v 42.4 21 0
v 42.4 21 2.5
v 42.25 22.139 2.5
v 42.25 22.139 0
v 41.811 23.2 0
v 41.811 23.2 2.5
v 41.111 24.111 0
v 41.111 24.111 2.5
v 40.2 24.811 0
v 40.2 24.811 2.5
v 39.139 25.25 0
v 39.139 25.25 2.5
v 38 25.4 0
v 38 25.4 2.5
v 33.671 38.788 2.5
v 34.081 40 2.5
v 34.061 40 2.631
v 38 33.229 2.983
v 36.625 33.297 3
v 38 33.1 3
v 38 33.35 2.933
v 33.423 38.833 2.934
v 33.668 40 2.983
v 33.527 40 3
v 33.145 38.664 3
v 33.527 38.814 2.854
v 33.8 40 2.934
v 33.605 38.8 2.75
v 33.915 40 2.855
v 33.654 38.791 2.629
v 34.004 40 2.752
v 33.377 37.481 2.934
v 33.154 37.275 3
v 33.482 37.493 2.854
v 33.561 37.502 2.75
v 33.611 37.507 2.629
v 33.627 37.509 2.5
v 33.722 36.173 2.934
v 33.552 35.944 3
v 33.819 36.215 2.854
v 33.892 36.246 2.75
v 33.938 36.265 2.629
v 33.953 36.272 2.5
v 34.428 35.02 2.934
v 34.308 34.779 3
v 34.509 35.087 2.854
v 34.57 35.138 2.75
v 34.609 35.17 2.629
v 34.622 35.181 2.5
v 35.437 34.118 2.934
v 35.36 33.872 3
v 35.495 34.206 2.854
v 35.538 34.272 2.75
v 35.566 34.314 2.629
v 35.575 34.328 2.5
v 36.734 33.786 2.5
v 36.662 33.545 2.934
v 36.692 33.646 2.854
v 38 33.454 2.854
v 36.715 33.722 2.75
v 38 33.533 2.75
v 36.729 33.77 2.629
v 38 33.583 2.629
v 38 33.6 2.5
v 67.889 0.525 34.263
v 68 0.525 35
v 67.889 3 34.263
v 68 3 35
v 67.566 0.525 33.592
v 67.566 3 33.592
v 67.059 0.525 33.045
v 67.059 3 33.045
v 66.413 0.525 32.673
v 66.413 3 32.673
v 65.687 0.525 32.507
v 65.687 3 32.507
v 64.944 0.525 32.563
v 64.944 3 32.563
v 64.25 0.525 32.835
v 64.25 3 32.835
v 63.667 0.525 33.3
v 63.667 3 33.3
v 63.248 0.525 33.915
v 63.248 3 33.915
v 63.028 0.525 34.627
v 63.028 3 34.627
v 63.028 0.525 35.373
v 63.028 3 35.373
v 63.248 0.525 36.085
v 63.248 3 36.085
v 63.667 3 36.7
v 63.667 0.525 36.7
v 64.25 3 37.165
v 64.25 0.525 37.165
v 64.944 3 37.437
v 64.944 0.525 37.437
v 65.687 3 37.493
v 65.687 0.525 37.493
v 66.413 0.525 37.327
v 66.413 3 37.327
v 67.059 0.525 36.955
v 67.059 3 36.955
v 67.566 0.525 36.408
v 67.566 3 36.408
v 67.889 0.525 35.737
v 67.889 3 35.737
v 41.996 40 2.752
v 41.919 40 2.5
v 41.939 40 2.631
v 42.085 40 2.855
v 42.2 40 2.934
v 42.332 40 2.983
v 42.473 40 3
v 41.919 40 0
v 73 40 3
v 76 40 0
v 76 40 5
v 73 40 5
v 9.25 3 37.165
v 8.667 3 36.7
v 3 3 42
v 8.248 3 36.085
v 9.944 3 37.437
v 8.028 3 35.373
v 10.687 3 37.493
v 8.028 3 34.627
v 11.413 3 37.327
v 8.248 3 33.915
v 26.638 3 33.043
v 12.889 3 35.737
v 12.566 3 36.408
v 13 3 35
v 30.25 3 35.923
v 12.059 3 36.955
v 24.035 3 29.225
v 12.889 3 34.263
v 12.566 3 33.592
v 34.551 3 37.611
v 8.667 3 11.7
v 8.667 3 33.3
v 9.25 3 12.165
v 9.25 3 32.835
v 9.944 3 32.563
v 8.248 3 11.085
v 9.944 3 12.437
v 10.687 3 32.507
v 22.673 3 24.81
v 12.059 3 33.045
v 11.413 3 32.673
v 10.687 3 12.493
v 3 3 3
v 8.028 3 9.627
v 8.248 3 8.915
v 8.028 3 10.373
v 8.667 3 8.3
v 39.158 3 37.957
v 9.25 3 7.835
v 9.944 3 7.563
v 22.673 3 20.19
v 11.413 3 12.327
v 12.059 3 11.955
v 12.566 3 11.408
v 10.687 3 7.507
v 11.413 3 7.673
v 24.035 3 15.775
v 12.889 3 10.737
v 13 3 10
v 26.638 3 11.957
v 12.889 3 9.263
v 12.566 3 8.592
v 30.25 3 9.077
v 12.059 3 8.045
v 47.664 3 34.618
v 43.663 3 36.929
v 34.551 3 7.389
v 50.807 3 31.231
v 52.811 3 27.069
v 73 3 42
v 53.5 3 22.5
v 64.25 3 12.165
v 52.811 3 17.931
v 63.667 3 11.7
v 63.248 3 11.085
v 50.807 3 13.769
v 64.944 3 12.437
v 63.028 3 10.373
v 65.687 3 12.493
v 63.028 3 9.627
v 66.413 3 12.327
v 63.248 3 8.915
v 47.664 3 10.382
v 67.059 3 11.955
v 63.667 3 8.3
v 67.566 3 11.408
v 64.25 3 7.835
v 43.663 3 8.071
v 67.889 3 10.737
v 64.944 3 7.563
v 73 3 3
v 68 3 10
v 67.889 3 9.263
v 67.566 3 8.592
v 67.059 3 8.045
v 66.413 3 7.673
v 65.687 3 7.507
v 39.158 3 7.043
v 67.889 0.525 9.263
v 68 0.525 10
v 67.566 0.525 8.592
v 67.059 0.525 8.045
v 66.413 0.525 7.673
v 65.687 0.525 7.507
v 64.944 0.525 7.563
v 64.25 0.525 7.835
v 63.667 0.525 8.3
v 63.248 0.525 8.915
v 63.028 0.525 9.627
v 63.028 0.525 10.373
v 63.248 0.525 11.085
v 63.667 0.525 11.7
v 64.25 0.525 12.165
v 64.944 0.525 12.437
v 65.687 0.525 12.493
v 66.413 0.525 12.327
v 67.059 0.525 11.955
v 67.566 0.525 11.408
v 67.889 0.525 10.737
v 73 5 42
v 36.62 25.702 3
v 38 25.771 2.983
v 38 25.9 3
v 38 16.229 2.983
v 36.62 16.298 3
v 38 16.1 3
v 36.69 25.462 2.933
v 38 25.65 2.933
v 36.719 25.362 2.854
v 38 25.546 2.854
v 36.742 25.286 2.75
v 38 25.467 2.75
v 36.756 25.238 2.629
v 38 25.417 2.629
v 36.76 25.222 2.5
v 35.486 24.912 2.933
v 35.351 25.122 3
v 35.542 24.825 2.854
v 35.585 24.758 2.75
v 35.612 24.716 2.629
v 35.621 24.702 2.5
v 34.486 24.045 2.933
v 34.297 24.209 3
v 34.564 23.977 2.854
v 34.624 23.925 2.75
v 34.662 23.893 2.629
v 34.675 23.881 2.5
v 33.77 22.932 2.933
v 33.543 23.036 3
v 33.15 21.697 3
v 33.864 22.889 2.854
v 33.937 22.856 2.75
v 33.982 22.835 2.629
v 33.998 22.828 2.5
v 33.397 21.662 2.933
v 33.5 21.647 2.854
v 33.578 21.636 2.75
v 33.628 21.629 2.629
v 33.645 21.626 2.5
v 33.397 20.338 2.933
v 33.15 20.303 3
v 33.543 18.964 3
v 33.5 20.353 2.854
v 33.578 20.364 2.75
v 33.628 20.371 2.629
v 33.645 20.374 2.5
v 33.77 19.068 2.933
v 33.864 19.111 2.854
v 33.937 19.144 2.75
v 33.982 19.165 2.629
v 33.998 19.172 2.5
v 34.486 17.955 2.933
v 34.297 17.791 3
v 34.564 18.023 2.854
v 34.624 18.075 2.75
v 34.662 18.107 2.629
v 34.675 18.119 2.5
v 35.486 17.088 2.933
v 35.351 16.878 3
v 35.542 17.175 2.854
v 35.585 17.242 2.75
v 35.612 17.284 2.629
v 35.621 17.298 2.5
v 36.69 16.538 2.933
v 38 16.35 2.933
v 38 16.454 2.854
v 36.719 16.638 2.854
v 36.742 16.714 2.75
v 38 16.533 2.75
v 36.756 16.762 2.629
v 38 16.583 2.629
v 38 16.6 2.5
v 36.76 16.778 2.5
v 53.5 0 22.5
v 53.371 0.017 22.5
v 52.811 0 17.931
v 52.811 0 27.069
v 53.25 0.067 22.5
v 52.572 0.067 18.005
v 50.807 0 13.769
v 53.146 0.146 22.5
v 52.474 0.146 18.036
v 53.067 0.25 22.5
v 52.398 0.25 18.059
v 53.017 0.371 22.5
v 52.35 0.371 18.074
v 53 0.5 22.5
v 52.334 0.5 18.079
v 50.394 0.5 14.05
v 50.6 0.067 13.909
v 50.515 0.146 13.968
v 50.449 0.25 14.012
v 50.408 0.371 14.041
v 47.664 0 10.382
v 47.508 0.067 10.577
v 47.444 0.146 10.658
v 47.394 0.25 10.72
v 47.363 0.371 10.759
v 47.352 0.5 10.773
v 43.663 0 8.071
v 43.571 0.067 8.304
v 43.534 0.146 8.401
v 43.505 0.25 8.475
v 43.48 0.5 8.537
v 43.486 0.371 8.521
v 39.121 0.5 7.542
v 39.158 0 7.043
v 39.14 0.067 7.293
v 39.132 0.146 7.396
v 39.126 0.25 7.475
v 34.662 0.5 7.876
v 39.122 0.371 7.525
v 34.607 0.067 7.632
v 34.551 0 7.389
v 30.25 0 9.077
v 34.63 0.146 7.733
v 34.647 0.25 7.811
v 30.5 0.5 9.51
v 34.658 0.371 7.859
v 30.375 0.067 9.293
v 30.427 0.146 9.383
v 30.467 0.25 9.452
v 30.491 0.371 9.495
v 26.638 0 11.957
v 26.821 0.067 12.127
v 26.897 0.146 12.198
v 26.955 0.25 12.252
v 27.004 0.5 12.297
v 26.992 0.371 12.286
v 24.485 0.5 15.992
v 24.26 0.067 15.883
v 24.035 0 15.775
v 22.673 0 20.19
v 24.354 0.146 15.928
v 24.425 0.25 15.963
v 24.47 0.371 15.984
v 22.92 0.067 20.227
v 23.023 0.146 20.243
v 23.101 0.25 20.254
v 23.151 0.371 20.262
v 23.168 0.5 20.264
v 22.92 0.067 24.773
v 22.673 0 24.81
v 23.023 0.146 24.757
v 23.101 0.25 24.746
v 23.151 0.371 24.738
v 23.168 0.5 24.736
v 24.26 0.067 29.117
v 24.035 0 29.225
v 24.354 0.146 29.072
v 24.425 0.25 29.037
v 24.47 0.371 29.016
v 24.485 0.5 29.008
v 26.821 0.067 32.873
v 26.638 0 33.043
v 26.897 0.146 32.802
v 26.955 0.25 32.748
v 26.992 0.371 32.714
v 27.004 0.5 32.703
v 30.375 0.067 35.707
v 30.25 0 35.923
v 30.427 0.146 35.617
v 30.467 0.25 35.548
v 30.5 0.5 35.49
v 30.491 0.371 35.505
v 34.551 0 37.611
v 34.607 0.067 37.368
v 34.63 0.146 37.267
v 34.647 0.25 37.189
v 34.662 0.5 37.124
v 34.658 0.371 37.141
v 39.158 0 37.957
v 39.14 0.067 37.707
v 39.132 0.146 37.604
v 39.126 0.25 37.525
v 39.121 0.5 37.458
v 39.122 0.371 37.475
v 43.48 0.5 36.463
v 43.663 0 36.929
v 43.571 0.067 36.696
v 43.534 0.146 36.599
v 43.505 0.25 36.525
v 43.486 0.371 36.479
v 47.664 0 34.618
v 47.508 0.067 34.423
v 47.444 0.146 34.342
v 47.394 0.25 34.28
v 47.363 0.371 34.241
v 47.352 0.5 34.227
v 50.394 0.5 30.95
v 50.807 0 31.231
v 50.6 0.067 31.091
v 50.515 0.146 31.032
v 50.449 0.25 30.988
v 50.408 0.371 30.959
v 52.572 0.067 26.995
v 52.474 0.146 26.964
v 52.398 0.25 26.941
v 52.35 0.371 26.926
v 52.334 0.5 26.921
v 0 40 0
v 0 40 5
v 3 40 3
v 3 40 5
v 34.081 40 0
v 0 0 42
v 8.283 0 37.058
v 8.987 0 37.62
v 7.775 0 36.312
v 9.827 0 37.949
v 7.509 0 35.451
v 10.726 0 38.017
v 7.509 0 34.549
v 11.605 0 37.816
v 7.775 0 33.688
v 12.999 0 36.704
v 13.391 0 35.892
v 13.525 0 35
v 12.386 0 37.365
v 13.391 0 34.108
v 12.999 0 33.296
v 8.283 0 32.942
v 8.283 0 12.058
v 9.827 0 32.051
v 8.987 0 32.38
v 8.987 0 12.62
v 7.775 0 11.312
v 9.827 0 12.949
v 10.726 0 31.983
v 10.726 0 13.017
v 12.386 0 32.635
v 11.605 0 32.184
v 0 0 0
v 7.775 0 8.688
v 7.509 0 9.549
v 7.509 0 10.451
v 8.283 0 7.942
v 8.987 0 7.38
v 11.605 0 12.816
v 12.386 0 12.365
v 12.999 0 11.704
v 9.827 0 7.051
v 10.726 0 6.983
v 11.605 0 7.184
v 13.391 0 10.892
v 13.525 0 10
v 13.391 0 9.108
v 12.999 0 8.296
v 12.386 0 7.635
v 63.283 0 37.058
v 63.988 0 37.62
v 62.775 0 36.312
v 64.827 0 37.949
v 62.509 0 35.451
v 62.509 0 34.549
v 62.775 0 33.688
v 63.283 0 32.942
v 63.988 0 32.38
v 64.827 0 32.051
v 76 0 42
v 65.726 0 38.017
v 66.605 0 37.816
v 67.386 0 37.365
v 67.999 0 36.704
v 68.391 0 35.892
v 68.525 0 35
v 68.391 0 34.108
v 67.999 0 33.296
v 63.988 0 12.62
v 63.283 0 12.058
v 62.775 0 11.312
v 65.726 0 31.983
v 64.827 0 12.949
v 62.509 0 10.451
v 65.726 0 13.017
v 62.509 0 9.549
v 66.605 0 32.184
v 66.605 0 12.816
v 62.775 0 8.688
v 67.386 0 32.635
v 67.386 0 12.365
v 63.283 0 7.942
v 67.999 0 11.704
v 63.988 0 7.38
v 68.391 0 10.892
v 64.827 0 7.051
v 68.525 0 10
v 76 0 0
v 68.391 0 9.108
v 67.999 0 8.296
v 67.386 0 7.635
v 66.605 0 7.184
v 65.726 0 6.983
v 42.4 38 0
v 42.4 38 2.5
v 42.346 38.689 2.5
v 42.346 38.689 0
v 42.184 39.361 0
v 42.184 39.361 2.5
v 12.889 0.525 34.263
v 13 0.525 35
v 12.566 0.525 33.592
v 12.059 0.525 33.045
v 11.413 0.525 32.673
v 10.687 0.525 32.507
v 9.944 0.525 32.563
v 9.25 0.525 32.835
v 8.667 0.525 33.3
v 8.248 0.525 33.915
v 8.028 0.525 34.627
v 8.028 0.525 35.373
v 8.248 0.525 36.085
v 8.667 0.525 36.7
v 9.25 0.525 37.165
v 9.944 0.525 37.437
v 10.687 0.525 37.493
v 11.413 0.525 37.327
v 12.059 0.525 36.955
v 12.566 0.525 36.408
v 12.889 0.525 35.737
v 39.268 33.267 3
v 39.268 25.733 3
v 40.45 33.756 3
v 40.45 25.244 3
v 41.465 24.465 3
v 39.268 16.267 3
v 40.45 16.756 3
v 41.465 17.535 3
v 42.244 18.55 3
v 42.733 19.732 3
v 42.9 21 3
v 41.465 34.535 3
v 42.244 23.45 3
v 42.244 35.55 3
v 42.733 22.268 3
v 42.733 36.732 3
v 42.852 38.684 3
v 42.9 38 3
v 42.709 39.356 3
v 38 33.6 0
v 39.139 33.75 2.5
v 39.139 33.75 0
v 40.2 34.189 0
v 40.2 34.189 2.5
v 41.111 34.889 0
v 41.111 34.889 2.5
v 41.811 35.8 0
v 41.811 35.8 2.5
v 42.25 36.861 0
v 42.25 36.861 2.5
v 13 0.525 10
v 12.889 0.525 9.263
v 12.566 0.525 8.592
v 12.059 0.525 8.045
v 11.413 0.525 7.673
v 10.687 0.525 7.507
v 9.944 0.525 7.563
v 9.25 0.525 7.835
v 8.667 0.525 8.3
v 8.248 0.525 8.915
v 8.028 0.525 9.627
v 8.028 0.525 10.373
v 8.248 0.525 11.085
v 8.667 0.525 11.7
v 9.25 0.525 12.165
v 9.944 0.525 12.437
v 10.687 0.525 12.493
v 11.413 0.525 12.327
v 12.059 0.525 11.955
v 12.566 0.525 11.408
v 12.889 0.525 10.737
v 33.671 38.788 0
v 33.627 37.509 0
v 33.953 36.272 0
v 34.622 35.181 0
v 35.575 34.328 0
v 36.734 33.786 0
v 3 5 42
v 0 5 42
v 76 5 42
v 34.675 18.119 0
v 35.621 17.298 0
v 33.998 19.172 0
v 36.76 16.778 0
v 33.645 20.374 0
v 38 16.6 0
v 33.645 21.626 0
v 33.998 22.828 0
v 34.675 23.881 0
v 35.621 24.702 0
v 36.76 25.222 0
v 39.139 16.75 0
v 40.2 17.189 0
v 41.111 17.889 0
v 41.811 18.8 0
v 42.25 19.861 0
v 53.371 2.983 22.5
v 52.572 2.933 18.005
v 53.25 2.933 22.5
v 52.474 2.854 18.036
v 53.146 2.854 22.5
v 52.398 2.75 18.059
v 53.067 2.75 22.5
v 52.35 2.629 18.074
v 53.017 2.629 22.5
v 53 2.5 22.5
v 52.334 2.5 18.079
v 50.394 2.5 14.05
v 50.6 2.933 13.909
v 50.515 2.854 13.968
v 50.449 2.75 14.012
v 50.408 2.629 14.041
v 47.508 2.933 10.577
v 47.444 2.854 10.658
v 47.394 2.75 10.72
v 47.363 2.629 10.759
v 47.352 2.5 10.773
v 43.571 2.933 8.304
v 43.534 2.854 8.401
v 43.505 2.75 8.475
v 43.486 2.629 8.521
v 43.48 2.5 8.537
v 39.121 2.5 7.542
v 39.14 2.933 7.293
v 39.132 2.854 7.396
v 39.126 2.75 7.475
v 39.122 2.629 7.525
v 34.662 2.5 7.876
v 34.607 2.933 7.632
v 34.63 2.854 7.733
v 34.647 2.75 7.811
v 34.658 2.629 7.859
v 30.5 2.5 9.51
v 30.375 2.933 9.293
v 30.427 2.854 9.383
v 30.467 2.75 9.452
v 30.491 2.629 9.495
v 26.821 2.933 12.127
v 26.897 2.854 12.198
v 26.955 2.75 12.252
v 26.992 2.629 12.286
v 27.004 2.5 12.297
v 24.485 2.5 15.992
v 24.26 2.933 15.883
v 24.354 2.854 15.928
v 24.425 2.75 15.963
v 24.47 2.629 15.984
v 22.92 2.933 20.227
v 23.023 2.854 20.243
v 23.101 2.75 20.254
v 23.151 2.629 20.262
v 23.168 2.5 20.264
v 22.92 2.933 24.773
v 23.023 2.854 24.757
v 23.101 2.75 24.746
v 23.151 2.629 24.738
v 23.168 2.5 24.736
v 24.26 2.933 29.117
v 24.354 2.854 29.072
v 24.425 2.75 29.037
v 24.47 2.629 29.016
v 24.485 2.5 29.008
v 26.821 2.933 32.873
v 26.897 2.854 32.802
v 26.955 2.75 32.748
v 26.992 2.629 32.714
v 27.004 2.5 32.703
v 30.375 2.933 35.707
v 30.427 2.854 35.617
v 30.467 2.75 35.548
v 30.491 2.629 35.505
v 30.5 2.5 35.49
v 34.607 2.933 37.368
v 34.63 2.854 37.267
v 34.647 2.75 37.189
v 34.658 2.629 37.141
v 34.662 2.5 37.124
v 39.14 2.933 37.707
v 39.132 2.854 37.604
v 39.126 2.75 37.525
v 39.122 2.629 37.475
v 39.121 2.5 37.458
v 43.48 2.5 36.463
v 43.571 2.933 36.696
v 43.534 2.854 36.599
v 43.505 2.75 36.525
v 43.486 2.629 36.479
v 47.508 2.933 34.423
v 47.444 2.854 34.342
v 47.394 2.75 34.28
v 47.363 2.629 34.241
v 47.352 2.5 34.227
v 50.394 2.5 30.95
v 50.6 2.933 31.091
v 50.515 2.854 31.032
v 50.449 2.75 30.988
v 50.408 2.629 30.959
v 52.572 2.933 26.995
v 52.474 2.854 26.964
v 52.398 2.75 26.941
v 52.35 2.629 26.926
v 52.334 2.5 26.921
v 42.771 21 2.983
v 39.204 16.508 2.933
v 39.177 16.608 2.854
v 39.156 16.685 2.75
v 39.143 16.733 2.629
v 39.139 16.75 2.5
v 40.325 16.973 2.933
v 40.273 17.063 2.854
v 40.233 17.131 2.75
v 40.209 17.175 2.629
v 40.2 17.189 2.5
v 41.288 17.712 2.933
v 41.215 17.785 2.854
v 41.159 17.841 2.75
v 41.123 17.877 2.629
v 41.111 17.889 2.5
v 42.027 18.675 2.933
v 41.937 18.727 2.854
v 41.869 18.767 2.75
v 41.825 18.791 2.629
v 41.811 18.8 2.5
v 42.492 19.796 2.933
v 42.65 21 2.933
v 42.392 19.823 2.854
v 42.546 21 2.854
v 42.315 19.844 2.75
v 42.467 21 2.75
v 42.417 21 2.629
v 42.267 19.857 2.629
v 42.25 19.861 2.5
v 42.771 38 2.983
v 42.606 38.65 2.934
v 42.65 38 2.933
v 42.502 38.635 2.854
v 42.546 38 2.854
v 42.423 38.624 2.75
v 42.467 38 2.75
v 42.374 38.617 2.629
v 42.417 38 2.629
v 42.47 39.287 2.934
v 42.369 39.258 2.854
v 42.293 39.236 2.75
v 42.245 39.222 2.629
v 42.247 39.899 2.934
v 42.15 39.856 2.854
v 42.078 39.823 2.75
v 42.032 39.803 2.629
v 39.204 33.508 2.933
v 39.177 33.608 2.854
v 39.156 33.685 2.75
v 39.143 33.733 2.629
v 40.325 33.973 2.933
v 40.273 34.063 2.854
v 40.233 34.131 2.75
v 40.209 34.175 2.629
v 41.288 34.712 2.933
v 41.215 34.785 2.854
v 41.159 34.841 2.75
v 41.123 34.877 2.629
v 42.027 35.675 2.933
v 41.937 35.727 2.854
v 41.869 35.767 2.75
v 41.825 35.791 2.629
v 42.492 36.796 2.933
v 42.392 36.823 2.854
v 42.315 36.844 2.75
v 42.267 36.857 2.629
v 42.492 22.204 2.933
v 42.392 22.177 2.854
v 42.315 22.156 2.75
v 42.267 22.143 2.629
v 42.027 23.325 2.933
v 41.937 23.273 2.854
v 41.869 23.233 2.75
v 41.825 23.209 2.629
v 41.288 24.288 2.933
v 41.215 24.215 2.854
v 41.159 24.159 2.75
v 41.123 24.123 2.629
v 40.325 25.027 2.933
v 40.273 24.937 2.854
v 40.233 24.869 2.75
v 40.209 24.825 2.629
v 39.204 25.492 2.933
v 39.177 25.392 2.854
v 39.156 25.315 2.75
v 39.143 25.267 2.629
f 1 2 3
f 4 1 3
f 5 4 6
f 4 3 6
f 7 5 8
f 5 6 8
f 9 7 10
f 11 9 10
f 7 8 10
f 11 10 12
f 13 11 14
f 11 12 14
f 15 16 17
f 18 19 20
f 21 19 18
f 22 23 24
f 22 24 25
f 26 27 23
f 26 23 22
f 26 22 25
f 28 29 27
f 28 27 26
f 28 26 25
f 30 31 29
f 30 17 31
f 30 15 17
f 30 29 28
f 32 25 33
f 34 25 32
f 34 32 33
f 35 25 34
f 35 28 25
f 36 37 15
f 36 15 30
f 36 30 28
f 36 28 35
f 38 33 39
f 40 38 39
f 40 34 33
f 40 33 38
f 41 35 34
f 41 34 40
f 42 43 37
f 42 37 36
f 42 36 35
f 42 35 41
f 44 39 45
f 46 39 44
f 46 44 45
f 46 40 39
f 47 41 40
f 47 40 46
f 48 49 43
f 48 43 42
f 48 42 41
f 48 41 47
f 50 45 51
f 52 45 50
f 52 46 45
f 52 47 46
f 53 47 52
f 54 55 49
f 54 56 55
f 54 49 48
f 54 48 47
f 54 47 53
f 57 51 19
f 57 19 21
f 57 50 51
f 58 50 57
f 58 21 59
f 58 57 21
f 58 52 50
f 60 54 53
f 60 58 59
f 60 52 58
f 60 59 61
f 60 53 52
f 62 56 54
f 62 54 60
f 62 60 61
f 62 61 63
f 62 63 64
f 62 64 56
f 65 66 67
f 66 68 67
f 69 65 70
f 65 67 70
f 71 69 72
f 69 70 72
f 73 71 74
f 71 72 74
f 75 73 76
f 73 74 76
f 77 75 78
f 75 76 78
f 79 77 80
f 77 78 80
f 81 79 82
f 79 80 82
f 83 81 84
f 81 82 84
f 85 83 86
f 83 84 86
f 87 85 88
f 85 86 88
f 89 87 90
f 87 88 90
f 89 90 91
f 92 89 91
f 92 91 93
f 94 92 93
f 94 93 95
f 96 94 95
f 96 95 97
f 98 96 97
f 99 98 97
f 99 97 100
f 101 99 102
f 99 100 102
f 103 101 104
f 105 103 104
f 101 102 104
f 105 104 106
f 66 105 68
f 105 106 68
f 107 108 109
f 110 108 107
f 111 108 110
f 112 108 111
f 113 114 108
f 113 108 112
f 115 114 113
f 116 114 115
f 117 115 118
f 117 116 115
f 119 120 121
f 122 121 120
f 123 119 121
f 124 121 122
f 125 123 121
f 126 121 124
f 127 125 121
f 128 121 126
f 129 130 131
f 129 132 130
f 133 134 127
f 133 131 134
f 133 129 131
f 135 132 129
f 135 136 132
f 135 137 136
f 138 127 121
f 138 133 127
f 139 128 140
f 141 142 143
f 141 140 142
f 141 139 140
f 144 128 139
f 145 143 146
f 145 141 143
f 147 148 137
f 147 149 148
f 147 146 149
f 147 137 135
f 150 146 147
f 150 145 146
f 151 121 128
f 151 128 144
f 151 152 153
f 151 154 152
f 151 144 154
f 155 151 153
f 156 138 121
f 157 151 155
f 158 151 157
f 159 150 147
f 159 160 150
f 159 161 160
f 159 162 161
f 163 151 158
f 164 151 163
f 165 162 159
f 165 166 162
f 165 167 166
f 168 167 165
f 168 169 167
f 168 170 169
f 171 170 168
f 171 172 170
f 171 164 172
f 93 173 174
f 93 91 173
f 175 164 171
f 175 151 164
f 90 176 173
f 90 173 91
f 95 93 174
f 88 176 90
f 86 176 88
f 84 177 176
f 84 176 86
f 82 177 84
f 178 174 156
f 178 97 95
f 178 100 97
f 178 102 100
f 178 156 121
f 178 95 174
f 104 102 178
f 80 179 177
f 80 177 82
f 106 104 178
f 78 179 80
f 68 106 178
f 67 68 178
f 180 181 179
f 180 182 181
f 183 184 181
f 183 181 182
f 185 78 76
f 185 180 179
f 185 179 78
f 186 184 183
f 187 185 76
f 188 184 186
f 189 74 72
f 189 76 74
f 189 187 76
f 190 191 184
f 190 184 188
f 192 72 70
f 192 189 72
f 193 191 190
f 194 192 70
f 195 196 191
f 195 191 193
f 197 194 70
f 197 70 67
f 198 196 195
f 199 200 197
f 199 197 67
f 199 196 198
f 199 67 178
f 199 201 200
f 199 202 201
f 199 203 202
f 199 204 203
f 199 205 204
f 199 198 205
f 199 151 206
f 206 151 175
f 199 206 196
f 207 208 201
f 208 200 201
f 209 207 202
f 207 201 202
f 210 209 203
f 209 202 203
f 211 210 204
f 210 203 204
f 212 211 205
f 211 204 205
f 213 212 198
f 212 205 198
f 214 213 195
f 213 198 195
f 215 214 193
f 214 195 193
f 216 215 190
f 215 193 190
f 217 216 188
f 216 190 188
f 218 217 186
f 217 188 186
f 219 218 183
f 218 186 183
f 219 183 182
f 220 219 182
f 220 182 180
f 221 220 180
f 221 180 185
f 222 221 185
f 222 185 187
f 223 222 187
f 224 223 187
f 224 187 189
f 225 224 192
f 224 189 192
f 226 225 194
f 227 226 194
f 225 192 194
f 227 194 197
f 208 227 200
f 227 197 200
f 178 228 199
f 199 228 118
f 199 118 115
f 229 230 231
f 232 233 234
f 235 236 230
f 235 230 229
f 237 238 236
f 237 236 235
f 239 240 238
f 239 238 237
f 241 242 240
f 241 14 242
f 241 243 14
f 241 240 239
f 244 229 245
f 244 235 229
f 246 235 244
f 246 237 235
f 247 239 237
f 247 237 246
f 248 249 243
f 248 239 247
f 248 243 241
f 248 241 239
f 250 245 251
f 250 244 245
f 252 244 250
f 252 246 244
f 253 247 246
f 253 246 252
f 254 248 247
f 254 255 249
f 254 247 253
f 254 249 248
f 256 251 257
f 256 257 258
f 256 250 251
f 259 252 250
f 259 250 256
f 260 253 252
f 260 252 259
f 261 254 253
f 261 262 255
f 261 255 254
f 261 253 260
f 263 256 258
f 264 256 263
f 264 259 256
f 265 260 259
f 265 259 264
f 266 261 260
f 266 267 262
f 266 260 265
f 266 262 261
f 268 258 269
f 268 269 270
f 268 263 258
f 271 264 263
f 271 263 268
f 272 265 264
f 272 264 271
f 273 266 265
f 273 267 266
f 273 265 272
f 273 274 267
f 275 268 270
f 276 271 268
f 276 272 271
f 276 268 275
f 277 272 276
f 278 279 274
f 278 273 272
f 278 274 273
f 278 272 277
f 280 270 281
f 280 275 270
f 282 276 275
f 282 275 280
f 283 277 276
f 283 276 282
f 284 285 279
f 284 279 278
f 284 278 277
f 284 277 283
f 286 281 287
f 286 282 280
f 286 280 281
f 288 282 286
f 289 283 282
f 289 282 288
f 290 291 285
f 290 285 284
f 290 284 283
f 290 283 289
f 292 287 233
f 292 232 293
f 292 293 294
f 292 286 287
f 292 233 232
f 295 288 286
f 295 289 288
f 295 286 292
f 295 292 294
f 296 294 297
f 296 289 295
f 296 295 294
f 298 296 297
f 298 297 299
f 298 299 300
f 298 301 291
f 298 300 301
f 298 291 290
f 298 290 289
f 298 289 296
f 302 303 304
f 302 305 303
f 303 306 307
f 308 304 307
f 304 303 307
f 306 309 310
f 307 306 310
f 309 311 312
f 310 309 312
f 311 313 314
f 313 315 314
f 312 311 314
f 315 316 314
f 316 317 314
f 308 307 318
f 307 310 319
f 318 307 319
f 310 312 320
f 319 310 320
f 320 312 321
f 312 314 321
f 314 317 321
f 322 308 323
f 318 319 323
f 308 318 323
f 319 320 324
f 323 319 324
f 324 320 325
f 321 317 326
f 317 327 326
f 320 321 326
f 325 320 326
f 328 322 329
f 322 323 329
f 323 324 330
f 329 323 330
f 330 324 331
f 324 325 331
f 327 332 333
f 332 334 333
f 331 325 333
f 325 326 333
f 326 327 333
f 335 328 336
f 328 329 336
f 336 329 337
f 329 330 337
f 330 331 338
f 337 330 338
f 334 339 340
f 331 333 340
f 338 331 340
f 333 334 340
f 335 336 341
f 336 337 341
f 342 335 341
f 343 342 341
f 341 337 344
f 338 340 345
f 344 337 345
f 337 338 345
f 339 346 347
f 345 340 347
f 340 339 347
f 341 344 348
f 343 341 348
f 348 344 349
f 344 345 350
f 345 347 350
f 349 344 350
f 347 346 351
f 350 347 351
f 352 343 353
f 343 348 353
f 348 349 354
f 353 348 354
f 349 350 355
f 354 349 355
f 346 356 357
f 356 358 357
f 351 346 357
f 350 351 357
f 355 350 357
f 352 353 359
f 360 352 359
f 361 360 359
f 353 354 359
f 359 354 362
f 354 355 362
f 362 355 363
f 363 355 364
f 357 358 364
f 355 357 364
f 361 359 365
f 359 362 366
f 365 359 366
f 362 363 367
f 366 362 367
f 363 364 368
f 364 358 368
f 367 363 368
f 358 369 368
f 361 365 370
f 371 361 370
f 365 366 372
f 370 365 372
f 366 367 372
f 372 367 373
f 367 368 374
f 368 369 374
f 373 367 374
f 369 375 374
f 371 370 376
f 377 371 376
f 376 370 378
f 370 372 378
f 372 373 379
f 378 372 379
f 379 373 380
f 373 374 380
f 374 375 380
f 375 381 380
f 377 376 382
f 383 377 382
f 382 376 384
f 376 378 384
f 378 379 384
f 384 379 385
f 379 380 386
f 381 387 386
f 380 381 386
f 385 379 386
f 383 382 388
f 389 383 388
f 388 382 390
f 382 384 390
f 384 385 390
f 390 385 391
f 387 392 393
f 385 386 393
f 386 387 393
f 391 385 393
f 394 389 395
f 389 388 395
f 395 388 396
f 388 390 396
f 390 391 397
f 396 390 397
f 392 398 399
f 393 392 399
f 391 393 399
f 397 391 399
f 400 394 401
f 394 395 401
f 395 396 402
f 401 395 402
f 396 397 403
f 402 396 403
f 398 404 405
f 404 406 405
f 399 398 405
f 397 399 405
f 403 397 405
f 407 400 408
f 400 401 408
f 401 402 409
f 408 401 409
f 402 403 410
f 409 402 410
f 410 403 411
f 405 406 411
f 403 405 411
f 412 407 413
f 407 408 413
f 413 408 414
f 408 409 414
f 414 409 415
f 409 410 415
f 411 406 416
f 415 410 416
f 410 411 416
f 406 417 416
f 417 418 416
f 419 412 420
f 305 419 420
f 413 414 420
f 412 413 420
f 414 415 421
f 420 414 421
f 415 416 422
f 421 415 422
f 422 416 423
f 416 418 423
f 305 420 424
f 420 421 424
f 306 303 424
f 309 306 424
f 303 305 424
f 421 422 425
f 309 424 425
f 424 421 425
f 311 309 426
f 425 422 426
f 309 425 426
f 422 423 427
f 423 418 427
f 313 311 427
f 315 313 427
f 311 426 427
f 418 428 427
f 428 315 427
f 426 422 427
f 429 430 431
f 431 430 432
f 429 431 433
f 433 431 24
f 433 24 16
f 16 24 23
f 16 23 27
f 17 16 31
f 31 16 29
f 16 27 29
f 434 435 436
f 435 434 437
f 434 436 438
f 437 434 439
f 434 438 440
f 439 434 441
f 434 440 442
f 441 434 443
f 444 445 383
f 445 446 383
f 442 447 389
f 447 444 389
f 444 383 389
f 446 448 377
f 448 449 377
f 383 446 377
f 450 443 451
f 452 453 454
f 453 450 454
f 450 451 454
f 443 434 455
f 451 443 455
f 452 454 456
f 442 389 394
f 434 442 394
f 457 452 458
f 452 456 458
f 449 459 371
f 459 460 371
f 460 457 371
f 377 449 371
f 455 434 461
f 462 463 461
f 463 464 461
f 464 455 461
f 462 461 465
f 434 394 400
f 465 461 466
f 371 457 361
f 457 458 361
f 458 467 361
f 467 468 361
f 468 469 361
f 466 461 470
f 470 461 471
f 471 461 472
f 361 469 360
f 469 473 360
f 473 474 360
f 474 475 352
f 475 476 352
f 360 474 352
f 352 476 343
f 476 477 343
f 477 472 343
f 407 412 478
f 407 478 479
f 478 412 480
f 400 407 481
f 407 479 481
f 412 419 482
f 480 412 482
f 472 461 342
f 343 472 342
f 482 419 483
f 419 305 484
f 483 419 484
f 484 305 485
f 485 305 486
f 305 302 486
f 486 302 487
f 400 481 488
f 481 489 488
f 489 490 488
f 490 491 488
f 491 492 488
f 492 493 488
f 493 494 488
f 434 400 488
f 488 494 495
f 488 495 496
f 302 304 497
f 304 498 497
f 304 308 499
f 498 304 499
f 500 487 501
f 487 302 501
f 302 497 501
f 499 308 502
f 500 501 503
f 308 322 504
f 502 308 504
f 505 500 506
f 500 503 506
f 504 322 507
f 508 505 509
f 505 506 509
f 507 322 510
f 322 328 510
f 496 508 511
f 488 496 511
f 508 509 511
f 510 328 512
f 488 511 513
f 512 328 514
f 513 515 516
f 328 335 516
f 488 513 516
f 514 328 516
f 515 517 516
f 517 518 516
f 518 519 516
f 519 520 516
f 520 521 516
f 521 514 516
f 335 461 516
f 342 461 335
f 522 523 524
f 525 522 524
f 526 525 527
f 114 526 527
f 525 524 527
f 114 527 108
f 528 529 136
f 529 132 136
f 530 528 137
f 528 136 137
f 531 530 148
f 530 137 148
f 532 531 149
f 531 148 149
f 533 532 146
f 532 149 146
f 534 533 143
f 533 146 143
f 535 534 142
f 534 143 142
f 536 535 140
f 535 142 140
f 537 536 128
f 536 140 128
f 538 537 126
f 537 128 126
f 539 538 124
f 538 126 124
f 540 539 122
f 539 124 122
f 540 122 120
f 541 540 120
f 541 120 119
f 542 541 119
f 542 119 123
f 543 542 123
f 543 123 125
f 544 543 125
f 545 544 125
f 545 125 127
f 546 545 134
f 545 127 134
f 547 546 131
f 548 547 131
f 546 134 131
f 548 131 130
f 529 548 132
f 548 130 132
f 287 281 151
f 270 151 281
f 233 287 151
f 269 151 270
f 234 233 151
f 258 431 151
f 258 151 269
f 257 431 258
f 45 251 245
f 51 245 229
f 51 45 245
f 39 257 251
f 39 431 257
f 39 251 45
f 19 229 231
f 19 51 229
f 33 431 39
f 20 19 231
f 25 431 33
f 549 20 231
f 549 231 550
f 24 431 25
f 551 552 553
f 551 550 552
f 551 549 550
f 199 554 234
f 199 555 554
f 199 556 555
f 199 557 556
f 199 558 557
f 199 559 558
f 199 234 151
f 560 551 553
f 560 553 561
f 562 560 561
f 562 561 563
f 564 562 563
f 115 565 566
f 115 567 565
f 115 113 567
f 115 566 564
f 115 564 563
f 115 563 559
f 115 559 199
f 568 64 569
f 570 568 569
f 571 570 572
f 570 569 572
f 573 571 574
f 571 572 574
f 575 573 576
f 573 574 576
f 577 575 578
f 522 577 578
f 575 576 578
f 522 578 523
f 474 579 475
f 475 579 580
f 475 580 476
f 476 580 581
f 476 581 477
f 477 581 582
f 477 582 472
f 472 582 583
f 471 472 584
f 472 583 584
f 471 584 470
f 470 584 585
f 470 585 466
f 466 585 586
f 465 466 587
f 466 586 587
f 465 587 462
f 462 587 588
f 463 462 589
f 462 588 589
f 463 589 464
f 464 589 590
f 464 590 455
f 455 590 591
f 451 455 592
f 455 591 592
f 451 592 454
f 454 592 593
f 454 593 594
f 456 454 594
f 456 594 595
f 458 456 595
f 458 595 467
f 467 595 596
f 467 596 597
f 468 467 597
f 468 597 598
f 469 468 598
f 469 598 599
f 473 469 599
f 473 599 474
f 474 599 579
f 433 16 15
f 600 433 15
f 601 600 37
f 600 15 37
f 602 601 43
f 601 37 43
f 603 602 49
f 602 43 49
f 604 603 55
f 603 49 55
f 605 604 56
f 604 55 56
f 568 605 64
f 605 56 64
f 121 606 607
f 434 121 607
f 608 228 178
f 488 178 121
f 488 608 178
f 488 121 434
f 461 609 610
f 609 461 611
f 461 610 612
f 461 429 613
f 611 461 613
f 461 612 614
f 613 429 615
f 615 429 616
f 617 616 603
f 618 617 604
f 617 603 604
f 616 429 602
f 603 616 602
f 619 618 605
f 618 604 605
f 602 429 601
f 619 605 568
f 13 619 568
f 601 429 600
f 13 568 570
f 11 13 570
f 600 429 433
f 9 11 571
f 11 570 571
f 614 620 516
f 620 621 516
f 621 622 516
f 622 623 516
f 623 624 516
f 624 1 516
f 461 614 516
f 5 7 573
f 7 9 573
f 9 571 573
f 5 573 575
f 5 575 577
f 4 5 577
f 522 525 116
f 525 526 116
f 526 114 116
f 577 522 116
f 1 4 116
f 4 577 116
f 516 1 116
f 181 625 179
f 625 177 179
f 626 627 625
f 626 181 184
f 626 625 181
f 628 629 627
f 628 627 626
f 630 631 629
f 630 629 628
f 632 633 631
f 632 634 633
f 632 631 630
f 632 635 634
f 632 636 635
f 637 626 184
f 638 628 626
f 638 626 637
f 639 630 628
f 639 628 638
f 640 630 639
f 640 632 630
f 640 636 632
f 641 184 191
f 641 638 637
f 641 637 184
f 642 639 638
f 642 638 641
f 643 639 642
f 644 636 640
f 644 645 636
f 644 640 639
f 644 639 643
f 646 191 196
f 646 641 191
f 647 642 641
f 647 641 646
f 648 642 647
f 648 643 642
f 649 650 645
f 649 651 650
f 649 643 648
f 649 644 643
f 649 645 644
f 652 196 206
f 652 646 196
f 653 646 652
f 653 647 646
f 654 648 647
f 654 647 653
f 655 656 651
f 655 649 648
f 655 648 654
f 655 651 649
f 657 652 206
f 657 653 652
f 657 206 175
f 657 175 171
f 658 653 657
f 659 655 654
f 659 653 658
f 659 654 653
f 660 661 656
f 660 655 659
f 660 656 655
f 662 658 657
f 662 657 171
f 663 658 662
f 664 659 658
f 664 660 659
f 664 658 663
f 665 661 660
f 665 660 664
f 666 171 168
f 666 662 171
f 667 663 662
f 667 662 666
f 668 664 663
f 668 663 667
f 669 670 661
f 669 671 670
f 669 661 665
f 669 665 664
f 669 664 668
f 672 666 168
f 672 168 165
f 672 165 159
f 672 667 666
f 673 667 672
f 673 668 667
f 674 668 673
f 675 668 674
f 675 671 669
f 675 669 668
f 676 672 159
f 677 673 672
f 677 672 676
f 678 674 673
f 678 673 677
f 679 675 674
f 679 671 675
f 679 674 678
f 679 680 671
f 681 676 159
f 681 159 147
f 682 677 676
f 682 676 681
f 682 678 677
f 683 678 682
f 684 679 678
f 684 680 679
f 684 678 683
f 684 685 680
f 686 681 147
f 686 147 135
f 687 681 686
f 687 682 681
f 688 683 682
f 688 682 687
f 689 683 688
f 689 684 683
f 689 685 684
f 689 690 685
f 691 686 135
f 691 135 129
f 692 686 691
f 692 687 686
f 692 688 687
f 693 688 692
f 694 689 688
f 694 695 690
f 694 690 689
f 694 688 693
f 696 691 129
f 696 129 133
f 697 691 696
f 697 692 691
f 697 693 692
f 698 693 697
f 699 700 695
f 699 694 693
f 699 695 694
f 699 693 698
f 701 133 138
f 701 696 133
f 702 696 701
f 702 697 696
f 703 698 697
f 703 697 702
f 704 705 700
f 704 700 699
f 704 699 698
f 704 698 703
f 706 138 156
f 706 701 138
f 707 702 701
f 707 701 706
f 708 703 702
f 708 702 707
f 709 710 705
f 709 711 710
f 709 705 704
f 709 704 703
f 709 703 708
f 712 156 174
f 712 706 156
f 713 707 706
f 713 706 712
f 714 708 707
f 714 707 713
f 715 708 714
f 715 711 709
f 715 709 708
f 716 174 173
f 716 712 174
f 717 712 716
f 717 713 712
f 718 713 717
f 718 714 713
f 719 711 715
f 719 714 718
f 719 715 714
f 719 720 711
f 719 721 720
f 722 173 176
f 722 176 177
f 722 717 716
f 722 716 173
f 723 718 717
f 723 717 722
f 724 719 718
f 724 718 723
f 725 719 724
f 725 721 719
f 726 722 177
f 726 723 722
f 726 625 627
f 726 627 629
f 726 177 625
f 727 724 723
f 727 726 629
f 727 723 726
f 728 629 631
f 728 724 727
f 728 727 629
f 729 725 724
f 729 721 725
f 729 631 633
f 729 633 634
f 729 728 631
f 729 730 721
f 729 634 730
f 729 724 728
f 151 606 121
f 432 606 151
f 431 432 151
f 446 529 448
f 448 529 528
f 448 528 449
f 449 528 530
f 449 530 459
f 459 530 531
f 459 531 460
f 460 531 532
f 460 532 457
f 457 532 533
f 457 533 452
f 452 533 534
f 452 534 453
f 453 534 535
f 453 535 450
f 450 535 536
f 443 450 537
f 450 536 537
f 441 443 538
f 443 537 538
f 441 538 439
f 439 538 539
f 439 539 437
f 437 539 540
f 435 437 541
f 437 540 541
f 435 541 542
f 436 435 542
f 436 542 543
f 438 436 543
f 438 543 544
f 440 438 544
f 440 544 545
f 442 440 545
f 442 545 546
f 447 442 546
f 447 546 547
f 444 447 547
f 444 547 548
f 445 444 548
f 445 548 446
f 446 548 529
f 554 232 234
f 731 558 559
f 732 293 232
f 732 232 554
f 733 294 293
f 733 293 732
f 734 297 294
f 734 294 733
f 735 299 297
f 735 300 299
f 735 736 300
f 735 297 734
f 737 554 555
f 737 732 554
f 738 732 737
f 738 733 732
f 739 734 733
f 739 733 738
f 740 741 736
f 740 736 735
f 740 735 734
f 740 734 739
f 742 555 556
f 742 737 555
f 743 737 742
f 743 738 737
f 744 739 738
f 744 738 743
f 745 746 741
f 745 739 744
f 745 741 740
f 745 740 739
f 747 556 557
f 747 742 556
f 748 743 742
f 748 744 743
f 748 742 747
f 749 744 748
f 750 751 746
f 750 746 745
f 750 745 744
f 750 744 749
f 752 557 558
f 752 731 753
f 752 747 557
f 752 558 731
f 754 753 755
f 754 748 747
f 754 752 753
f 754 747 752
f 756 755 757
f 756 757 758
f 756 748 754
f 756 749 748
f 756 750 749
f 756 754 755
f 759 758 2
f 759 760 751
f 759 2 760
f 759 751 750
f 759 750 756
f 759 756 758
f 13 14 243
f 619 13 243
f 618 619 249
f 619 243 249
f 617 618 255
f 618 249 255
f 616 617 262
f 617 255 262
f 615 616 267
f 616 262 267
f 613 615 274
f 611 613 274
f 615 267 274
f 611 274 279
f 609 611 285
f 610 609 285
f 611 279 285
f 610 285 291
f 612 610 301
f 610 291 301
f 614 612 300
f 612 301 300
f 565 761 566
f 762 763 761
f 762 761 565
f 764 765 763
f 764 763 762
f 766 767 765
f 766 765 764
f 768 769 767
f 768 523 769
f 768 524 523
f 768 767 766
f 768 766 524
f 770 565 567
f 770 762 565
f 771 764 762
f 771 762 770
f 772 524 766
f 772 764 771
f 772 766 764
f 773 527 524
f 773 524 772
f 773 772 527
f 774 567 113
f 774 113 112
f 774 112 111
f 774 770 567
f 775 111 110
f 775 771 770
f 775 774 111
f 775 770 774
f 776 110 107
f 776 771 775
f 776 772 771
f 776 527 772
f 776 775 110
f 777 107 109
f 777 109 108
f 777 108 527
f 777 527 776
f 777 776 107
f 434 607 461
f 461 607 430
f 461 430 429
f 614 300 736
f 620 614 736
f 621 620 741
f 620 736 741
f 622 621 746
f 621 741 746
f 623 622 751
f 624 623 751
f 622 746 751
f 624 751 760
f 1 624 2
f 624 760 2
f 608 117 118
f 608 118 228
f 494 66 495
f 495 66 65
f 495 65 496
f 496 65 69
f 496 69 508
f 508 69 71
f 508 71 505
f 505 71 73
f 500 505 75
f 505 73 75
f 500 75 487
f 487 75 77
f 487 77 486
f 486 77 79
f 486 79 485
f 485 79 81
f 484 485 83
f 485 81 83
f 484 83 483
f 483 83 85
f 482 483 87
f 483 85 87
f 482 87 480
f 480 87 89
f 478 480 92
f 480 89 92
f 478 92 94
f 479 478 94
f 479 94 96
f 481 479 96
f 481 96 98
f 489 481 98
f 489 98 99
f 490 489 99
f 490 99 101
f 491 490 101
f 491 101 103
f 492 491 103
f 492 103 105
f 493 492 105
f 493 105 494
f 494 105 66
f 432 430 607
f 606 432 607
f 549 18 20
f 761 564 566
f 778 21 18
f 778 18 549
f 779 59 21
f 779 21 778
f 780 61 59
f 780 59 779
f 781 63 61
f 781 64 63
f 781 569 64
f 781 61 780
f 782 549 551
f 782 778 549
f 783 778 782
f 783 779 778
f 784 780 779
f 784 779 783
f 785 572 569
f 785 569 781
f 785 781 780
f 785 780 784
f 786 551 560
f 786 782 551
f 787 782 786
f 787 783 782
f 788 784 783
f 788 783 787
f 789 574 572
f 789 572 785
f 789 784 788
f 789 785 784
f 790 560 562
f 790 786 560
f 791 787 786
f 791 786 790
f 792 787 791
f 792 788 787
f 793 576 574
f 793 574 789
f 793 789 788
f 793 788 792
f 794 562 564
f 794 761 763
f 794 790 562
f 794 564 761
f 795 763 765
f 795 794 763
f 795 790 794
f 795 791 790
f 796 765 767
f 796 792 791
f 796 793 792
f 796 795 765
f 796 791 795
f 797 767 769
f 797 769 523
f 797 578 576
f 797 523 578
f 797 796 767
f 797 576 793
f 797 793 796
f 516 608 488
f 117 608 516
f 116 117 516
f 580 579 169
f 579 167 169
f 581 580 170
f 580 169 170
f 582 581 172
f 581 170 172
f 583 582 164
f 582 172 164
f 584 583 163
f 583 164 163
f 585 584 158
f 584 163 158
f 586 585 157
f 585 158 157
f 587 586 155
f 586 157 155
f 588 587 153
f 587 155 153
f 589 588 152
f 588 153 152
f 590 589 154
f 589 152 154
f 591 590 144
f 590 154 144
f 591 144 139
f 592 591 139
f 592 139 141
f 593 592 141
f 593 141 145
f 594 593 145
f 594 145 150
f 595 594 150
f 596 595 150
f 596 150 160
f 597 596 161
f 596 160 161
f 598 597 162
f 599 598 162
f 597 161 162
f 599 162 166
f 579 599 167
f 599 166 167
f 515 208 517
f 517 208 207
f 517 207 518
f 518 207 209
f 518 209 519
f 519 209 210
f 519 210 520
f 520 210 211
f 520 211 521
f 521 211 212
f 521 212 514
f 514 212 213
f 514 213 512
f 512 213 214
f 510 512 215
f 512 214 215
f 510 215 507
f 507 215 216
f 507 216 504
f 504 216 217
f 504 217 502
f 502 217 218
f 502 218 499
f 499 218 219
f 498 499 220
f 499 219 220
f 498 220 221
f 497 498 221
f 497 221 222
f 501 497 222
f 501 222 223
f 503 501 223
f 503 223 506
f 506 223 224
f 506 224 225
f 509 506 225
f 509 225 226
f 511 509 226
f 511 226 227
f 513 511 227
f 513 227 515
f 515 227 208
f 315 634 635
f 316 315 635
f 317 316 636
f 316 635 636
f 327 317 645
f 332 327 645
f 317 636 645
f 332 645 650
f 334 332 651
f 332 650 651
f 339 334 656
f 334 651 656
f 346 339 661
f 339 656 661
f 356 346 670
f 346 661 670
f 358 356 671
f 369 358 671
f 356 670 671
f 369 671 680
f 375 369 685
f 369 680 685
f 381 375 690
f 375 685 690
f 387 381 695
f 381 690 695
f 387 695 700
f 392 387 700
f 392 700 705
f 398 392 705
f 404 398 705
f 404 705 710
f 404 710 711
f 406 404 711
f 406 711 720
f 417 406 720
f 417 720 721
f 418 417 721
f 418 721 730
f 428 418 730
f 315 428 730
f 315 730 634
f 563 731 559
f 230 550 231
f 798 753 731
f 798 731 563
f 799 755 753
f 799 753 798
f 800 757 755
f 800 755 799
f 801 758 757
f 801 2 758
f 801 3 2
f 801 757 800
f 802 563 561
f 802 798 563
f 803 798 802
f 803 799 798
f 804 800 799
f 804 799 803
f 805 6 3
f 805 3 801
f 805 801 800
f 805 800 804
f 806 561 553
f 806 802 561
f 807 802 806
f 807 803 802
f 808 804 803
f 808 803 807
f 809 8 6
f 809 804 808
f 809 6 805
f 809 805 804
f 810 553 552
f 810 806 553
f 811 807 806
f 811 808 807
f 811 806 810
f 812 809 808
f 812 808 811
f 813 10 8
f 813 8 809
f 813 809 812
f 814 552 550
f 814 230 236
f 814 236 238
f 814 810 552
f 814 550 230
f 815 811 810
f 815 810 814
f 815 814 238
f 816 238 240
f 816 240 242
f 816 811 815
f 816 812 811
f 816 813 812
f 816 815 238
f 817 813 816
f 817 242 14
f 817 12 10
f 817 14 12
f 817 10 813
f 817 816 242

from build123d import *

# Parameters (mm, degrees)
EXTRUDE_1_DEPTH              = 3
SKETCH_2_W                   = 76
SKETCH_2_H                   = 3
EXTRUDE_2_DEPTH              = 39
CUT_EXTRUDE_1_DEPTH          = 52
CUT_EXTRUDE_2_DEPTH          = 52
EXTRUDE_3_DEPTH              = 3
HOLE_WIZARD_M6_2_D           = 5
HOLE_WIZARD_M6_2_CSINK_D     = 6.05
HOLE_WIZARD_M6_2_CSINK_ANGLE = 90
FILLET_4_R                   = 5
FILLET_5_R                   = 0.5
SKETCH_15_W                  = 76
SKETCH_15_H                  = 31.455270273
CUT_EXTRUDE_3_DEPTH          = 21


with BuildPart() as part:
    # 草图1 → 凸台-拉伸1 (new body)
    with BuildSketch(Plane.XY):
        Polygon((48, 70), (28, 70), (0, 40), (0, 0), (76, 0), (76, 40), align=None)
    extrude(amount=EXTRUDE_1_DEPTH)

    # 草图2 → 凸台-拉伸2 (add)
    with BuildSketch(Plane.XY.offset(3)):
        with Locations((38, 1.5)):
            Rectangle(SKETCH_2_W, SKETCH_2_H)
    extrude(amount=EXTRUDE_2_DEPTH)

    # 草图7 → 切除-拉伸1 (cut)
    with BuildSketch(Plane.XY.offset(3)):
        with BuildLine():
            ThreePointArc((42.4, 55), (41.111269837, 58.111269837), (38, 59.4))
            Line((38, 59.4), (38, 50.6))
            ThreePointArc((38, 50.6), (41.111269837, 51.888730163), (42.4, 55))
        make_face()
        with BuildLine():
            Line((38, 50.6), (38, 59.4))
            ThreePointArc((38, 59.4), (33.6, 55), (38, 50.6))
        make_face()
        with BuildLine():
            ThreePointArc((42.4, 38), (41.111269837, 41.111269837), (38, 42.4))
            Line((38, 42.4), (38, 33.6))
            ThreePointArc((38, 33.6), (41.111269837, 34.888730163), (42.4, 38))
        make_face()
        with BuildLine():
            Line((38, 33.6), (38, 42.4))
            ThreePointArc((38, 42.4), (33.6, 38), (38, 33.6))
        make_face()
        with BuildLine():
            ThreePointArc((42.4, 21), (41.111269837, 24.111269837), (38, 25.4))
            Line((38, 25.4), (38, 16.6))
            ThreePointArc((38, 16.6), (41.111269837, 17.888730163), (42.4, 21))
        make_face()
        with BuildLine():
            Line((38, 16.6), (38, 25.4))
            ThreePointArc((38, 25.4), (33.6, 21), (38, 16.6))
        make_face()
    extrude(amount=-CUT_EXTRUDE_1_DEPTH, mode=Mode.SUBTRACT)

    # 草图8 → 切除-拉伸2 (cut)
    with BuildSketch(Plane(origin=(0, 3, 0), x_dir=(1, 0, 0), z_dir=(0, 1, 0))):
        with BuildLine():
            ThreePointArc((23, -22.5), (38, -37.5), (53, -22.5))
            Line((53, -22.5), (23, -22.5))
        make_face()
        with BuildLine():
            Line((23, -22.5), (53, -22.5))
            ThreePointArc((53, -22.5), (38, -7.5), (23, -22.5))
        make_face()
    extrude(amount=-CUT_EXTRUDE_2_DEPTH, mode=Mode.SUBTRACT)

    # 草图10 → 凸台-拉伸3 (add)
    with BuildSketch(Plane.ZY):
        Polygon((3, 40), (5, 40), (42, 5), (42, 3), (3, 3), align=None)
    extrude_3 = extrude(amount=-EXTRUDE_3_DEPTH)

    # 镜向1: 凸台-拉伸3 across plane
    add(extrude_3.mirror(Plane(origin=(38, 0, 0), x_dir=(0, 0, 1), z_dir=(1, 0, 0))))

    # M6 螺纹孔2 (through all)
    with Locations(Plane(origin=(0, 0, 0), x_dir=(-1, 0, 0), z_dir=(0, -1, 0))):
        with Locations((-65.5, -10), (-10.5, -10), (-10.5, -35), (-65.5, -35)):
            CounterSinkHole(HOLE_WIZARD_M6_2_D / 2, HOLE_WIZARD_M6_2_CSINK_D / 2, counter_sink_angle=HOLE_WIZARD_M6_2_CSINK_ANGLE)

    # 圆角4
    fillet_4_edges = [part.edges().sort_by_distance(p)[0] for p in [
        (48, 70, 1.5),
        (28, 70, 1.5),
    ]]
    fillet(fillet_4_edges, radius=FILLET_4_R)

    # 圆角5
    fillet_5_edges = [part.edges().sort_by_distance(p)[0] for p in [
        (38, 50.6, 3),
        (38, 33.6, 3),
        (38, 16.6, 3),
        (23, 0, 22.5),
        (23, 3, 22.5),
    ]]
    fillet(fillet_5_edges, radius=FILLET_5_R)

    # 草图15 → 切除-拉伸3 (cut)
    with BuildSketch(Plane.XY.offset(3)):
        with Locations((38, 55.727635137)):
            Rectangle(SKETCH_15_W, SKETCH_15_H)
    extrude(amount=-CUT_EXTRUDE_3_DEPTH, mode=Mode.SUBTRACT)


solid = part.part
